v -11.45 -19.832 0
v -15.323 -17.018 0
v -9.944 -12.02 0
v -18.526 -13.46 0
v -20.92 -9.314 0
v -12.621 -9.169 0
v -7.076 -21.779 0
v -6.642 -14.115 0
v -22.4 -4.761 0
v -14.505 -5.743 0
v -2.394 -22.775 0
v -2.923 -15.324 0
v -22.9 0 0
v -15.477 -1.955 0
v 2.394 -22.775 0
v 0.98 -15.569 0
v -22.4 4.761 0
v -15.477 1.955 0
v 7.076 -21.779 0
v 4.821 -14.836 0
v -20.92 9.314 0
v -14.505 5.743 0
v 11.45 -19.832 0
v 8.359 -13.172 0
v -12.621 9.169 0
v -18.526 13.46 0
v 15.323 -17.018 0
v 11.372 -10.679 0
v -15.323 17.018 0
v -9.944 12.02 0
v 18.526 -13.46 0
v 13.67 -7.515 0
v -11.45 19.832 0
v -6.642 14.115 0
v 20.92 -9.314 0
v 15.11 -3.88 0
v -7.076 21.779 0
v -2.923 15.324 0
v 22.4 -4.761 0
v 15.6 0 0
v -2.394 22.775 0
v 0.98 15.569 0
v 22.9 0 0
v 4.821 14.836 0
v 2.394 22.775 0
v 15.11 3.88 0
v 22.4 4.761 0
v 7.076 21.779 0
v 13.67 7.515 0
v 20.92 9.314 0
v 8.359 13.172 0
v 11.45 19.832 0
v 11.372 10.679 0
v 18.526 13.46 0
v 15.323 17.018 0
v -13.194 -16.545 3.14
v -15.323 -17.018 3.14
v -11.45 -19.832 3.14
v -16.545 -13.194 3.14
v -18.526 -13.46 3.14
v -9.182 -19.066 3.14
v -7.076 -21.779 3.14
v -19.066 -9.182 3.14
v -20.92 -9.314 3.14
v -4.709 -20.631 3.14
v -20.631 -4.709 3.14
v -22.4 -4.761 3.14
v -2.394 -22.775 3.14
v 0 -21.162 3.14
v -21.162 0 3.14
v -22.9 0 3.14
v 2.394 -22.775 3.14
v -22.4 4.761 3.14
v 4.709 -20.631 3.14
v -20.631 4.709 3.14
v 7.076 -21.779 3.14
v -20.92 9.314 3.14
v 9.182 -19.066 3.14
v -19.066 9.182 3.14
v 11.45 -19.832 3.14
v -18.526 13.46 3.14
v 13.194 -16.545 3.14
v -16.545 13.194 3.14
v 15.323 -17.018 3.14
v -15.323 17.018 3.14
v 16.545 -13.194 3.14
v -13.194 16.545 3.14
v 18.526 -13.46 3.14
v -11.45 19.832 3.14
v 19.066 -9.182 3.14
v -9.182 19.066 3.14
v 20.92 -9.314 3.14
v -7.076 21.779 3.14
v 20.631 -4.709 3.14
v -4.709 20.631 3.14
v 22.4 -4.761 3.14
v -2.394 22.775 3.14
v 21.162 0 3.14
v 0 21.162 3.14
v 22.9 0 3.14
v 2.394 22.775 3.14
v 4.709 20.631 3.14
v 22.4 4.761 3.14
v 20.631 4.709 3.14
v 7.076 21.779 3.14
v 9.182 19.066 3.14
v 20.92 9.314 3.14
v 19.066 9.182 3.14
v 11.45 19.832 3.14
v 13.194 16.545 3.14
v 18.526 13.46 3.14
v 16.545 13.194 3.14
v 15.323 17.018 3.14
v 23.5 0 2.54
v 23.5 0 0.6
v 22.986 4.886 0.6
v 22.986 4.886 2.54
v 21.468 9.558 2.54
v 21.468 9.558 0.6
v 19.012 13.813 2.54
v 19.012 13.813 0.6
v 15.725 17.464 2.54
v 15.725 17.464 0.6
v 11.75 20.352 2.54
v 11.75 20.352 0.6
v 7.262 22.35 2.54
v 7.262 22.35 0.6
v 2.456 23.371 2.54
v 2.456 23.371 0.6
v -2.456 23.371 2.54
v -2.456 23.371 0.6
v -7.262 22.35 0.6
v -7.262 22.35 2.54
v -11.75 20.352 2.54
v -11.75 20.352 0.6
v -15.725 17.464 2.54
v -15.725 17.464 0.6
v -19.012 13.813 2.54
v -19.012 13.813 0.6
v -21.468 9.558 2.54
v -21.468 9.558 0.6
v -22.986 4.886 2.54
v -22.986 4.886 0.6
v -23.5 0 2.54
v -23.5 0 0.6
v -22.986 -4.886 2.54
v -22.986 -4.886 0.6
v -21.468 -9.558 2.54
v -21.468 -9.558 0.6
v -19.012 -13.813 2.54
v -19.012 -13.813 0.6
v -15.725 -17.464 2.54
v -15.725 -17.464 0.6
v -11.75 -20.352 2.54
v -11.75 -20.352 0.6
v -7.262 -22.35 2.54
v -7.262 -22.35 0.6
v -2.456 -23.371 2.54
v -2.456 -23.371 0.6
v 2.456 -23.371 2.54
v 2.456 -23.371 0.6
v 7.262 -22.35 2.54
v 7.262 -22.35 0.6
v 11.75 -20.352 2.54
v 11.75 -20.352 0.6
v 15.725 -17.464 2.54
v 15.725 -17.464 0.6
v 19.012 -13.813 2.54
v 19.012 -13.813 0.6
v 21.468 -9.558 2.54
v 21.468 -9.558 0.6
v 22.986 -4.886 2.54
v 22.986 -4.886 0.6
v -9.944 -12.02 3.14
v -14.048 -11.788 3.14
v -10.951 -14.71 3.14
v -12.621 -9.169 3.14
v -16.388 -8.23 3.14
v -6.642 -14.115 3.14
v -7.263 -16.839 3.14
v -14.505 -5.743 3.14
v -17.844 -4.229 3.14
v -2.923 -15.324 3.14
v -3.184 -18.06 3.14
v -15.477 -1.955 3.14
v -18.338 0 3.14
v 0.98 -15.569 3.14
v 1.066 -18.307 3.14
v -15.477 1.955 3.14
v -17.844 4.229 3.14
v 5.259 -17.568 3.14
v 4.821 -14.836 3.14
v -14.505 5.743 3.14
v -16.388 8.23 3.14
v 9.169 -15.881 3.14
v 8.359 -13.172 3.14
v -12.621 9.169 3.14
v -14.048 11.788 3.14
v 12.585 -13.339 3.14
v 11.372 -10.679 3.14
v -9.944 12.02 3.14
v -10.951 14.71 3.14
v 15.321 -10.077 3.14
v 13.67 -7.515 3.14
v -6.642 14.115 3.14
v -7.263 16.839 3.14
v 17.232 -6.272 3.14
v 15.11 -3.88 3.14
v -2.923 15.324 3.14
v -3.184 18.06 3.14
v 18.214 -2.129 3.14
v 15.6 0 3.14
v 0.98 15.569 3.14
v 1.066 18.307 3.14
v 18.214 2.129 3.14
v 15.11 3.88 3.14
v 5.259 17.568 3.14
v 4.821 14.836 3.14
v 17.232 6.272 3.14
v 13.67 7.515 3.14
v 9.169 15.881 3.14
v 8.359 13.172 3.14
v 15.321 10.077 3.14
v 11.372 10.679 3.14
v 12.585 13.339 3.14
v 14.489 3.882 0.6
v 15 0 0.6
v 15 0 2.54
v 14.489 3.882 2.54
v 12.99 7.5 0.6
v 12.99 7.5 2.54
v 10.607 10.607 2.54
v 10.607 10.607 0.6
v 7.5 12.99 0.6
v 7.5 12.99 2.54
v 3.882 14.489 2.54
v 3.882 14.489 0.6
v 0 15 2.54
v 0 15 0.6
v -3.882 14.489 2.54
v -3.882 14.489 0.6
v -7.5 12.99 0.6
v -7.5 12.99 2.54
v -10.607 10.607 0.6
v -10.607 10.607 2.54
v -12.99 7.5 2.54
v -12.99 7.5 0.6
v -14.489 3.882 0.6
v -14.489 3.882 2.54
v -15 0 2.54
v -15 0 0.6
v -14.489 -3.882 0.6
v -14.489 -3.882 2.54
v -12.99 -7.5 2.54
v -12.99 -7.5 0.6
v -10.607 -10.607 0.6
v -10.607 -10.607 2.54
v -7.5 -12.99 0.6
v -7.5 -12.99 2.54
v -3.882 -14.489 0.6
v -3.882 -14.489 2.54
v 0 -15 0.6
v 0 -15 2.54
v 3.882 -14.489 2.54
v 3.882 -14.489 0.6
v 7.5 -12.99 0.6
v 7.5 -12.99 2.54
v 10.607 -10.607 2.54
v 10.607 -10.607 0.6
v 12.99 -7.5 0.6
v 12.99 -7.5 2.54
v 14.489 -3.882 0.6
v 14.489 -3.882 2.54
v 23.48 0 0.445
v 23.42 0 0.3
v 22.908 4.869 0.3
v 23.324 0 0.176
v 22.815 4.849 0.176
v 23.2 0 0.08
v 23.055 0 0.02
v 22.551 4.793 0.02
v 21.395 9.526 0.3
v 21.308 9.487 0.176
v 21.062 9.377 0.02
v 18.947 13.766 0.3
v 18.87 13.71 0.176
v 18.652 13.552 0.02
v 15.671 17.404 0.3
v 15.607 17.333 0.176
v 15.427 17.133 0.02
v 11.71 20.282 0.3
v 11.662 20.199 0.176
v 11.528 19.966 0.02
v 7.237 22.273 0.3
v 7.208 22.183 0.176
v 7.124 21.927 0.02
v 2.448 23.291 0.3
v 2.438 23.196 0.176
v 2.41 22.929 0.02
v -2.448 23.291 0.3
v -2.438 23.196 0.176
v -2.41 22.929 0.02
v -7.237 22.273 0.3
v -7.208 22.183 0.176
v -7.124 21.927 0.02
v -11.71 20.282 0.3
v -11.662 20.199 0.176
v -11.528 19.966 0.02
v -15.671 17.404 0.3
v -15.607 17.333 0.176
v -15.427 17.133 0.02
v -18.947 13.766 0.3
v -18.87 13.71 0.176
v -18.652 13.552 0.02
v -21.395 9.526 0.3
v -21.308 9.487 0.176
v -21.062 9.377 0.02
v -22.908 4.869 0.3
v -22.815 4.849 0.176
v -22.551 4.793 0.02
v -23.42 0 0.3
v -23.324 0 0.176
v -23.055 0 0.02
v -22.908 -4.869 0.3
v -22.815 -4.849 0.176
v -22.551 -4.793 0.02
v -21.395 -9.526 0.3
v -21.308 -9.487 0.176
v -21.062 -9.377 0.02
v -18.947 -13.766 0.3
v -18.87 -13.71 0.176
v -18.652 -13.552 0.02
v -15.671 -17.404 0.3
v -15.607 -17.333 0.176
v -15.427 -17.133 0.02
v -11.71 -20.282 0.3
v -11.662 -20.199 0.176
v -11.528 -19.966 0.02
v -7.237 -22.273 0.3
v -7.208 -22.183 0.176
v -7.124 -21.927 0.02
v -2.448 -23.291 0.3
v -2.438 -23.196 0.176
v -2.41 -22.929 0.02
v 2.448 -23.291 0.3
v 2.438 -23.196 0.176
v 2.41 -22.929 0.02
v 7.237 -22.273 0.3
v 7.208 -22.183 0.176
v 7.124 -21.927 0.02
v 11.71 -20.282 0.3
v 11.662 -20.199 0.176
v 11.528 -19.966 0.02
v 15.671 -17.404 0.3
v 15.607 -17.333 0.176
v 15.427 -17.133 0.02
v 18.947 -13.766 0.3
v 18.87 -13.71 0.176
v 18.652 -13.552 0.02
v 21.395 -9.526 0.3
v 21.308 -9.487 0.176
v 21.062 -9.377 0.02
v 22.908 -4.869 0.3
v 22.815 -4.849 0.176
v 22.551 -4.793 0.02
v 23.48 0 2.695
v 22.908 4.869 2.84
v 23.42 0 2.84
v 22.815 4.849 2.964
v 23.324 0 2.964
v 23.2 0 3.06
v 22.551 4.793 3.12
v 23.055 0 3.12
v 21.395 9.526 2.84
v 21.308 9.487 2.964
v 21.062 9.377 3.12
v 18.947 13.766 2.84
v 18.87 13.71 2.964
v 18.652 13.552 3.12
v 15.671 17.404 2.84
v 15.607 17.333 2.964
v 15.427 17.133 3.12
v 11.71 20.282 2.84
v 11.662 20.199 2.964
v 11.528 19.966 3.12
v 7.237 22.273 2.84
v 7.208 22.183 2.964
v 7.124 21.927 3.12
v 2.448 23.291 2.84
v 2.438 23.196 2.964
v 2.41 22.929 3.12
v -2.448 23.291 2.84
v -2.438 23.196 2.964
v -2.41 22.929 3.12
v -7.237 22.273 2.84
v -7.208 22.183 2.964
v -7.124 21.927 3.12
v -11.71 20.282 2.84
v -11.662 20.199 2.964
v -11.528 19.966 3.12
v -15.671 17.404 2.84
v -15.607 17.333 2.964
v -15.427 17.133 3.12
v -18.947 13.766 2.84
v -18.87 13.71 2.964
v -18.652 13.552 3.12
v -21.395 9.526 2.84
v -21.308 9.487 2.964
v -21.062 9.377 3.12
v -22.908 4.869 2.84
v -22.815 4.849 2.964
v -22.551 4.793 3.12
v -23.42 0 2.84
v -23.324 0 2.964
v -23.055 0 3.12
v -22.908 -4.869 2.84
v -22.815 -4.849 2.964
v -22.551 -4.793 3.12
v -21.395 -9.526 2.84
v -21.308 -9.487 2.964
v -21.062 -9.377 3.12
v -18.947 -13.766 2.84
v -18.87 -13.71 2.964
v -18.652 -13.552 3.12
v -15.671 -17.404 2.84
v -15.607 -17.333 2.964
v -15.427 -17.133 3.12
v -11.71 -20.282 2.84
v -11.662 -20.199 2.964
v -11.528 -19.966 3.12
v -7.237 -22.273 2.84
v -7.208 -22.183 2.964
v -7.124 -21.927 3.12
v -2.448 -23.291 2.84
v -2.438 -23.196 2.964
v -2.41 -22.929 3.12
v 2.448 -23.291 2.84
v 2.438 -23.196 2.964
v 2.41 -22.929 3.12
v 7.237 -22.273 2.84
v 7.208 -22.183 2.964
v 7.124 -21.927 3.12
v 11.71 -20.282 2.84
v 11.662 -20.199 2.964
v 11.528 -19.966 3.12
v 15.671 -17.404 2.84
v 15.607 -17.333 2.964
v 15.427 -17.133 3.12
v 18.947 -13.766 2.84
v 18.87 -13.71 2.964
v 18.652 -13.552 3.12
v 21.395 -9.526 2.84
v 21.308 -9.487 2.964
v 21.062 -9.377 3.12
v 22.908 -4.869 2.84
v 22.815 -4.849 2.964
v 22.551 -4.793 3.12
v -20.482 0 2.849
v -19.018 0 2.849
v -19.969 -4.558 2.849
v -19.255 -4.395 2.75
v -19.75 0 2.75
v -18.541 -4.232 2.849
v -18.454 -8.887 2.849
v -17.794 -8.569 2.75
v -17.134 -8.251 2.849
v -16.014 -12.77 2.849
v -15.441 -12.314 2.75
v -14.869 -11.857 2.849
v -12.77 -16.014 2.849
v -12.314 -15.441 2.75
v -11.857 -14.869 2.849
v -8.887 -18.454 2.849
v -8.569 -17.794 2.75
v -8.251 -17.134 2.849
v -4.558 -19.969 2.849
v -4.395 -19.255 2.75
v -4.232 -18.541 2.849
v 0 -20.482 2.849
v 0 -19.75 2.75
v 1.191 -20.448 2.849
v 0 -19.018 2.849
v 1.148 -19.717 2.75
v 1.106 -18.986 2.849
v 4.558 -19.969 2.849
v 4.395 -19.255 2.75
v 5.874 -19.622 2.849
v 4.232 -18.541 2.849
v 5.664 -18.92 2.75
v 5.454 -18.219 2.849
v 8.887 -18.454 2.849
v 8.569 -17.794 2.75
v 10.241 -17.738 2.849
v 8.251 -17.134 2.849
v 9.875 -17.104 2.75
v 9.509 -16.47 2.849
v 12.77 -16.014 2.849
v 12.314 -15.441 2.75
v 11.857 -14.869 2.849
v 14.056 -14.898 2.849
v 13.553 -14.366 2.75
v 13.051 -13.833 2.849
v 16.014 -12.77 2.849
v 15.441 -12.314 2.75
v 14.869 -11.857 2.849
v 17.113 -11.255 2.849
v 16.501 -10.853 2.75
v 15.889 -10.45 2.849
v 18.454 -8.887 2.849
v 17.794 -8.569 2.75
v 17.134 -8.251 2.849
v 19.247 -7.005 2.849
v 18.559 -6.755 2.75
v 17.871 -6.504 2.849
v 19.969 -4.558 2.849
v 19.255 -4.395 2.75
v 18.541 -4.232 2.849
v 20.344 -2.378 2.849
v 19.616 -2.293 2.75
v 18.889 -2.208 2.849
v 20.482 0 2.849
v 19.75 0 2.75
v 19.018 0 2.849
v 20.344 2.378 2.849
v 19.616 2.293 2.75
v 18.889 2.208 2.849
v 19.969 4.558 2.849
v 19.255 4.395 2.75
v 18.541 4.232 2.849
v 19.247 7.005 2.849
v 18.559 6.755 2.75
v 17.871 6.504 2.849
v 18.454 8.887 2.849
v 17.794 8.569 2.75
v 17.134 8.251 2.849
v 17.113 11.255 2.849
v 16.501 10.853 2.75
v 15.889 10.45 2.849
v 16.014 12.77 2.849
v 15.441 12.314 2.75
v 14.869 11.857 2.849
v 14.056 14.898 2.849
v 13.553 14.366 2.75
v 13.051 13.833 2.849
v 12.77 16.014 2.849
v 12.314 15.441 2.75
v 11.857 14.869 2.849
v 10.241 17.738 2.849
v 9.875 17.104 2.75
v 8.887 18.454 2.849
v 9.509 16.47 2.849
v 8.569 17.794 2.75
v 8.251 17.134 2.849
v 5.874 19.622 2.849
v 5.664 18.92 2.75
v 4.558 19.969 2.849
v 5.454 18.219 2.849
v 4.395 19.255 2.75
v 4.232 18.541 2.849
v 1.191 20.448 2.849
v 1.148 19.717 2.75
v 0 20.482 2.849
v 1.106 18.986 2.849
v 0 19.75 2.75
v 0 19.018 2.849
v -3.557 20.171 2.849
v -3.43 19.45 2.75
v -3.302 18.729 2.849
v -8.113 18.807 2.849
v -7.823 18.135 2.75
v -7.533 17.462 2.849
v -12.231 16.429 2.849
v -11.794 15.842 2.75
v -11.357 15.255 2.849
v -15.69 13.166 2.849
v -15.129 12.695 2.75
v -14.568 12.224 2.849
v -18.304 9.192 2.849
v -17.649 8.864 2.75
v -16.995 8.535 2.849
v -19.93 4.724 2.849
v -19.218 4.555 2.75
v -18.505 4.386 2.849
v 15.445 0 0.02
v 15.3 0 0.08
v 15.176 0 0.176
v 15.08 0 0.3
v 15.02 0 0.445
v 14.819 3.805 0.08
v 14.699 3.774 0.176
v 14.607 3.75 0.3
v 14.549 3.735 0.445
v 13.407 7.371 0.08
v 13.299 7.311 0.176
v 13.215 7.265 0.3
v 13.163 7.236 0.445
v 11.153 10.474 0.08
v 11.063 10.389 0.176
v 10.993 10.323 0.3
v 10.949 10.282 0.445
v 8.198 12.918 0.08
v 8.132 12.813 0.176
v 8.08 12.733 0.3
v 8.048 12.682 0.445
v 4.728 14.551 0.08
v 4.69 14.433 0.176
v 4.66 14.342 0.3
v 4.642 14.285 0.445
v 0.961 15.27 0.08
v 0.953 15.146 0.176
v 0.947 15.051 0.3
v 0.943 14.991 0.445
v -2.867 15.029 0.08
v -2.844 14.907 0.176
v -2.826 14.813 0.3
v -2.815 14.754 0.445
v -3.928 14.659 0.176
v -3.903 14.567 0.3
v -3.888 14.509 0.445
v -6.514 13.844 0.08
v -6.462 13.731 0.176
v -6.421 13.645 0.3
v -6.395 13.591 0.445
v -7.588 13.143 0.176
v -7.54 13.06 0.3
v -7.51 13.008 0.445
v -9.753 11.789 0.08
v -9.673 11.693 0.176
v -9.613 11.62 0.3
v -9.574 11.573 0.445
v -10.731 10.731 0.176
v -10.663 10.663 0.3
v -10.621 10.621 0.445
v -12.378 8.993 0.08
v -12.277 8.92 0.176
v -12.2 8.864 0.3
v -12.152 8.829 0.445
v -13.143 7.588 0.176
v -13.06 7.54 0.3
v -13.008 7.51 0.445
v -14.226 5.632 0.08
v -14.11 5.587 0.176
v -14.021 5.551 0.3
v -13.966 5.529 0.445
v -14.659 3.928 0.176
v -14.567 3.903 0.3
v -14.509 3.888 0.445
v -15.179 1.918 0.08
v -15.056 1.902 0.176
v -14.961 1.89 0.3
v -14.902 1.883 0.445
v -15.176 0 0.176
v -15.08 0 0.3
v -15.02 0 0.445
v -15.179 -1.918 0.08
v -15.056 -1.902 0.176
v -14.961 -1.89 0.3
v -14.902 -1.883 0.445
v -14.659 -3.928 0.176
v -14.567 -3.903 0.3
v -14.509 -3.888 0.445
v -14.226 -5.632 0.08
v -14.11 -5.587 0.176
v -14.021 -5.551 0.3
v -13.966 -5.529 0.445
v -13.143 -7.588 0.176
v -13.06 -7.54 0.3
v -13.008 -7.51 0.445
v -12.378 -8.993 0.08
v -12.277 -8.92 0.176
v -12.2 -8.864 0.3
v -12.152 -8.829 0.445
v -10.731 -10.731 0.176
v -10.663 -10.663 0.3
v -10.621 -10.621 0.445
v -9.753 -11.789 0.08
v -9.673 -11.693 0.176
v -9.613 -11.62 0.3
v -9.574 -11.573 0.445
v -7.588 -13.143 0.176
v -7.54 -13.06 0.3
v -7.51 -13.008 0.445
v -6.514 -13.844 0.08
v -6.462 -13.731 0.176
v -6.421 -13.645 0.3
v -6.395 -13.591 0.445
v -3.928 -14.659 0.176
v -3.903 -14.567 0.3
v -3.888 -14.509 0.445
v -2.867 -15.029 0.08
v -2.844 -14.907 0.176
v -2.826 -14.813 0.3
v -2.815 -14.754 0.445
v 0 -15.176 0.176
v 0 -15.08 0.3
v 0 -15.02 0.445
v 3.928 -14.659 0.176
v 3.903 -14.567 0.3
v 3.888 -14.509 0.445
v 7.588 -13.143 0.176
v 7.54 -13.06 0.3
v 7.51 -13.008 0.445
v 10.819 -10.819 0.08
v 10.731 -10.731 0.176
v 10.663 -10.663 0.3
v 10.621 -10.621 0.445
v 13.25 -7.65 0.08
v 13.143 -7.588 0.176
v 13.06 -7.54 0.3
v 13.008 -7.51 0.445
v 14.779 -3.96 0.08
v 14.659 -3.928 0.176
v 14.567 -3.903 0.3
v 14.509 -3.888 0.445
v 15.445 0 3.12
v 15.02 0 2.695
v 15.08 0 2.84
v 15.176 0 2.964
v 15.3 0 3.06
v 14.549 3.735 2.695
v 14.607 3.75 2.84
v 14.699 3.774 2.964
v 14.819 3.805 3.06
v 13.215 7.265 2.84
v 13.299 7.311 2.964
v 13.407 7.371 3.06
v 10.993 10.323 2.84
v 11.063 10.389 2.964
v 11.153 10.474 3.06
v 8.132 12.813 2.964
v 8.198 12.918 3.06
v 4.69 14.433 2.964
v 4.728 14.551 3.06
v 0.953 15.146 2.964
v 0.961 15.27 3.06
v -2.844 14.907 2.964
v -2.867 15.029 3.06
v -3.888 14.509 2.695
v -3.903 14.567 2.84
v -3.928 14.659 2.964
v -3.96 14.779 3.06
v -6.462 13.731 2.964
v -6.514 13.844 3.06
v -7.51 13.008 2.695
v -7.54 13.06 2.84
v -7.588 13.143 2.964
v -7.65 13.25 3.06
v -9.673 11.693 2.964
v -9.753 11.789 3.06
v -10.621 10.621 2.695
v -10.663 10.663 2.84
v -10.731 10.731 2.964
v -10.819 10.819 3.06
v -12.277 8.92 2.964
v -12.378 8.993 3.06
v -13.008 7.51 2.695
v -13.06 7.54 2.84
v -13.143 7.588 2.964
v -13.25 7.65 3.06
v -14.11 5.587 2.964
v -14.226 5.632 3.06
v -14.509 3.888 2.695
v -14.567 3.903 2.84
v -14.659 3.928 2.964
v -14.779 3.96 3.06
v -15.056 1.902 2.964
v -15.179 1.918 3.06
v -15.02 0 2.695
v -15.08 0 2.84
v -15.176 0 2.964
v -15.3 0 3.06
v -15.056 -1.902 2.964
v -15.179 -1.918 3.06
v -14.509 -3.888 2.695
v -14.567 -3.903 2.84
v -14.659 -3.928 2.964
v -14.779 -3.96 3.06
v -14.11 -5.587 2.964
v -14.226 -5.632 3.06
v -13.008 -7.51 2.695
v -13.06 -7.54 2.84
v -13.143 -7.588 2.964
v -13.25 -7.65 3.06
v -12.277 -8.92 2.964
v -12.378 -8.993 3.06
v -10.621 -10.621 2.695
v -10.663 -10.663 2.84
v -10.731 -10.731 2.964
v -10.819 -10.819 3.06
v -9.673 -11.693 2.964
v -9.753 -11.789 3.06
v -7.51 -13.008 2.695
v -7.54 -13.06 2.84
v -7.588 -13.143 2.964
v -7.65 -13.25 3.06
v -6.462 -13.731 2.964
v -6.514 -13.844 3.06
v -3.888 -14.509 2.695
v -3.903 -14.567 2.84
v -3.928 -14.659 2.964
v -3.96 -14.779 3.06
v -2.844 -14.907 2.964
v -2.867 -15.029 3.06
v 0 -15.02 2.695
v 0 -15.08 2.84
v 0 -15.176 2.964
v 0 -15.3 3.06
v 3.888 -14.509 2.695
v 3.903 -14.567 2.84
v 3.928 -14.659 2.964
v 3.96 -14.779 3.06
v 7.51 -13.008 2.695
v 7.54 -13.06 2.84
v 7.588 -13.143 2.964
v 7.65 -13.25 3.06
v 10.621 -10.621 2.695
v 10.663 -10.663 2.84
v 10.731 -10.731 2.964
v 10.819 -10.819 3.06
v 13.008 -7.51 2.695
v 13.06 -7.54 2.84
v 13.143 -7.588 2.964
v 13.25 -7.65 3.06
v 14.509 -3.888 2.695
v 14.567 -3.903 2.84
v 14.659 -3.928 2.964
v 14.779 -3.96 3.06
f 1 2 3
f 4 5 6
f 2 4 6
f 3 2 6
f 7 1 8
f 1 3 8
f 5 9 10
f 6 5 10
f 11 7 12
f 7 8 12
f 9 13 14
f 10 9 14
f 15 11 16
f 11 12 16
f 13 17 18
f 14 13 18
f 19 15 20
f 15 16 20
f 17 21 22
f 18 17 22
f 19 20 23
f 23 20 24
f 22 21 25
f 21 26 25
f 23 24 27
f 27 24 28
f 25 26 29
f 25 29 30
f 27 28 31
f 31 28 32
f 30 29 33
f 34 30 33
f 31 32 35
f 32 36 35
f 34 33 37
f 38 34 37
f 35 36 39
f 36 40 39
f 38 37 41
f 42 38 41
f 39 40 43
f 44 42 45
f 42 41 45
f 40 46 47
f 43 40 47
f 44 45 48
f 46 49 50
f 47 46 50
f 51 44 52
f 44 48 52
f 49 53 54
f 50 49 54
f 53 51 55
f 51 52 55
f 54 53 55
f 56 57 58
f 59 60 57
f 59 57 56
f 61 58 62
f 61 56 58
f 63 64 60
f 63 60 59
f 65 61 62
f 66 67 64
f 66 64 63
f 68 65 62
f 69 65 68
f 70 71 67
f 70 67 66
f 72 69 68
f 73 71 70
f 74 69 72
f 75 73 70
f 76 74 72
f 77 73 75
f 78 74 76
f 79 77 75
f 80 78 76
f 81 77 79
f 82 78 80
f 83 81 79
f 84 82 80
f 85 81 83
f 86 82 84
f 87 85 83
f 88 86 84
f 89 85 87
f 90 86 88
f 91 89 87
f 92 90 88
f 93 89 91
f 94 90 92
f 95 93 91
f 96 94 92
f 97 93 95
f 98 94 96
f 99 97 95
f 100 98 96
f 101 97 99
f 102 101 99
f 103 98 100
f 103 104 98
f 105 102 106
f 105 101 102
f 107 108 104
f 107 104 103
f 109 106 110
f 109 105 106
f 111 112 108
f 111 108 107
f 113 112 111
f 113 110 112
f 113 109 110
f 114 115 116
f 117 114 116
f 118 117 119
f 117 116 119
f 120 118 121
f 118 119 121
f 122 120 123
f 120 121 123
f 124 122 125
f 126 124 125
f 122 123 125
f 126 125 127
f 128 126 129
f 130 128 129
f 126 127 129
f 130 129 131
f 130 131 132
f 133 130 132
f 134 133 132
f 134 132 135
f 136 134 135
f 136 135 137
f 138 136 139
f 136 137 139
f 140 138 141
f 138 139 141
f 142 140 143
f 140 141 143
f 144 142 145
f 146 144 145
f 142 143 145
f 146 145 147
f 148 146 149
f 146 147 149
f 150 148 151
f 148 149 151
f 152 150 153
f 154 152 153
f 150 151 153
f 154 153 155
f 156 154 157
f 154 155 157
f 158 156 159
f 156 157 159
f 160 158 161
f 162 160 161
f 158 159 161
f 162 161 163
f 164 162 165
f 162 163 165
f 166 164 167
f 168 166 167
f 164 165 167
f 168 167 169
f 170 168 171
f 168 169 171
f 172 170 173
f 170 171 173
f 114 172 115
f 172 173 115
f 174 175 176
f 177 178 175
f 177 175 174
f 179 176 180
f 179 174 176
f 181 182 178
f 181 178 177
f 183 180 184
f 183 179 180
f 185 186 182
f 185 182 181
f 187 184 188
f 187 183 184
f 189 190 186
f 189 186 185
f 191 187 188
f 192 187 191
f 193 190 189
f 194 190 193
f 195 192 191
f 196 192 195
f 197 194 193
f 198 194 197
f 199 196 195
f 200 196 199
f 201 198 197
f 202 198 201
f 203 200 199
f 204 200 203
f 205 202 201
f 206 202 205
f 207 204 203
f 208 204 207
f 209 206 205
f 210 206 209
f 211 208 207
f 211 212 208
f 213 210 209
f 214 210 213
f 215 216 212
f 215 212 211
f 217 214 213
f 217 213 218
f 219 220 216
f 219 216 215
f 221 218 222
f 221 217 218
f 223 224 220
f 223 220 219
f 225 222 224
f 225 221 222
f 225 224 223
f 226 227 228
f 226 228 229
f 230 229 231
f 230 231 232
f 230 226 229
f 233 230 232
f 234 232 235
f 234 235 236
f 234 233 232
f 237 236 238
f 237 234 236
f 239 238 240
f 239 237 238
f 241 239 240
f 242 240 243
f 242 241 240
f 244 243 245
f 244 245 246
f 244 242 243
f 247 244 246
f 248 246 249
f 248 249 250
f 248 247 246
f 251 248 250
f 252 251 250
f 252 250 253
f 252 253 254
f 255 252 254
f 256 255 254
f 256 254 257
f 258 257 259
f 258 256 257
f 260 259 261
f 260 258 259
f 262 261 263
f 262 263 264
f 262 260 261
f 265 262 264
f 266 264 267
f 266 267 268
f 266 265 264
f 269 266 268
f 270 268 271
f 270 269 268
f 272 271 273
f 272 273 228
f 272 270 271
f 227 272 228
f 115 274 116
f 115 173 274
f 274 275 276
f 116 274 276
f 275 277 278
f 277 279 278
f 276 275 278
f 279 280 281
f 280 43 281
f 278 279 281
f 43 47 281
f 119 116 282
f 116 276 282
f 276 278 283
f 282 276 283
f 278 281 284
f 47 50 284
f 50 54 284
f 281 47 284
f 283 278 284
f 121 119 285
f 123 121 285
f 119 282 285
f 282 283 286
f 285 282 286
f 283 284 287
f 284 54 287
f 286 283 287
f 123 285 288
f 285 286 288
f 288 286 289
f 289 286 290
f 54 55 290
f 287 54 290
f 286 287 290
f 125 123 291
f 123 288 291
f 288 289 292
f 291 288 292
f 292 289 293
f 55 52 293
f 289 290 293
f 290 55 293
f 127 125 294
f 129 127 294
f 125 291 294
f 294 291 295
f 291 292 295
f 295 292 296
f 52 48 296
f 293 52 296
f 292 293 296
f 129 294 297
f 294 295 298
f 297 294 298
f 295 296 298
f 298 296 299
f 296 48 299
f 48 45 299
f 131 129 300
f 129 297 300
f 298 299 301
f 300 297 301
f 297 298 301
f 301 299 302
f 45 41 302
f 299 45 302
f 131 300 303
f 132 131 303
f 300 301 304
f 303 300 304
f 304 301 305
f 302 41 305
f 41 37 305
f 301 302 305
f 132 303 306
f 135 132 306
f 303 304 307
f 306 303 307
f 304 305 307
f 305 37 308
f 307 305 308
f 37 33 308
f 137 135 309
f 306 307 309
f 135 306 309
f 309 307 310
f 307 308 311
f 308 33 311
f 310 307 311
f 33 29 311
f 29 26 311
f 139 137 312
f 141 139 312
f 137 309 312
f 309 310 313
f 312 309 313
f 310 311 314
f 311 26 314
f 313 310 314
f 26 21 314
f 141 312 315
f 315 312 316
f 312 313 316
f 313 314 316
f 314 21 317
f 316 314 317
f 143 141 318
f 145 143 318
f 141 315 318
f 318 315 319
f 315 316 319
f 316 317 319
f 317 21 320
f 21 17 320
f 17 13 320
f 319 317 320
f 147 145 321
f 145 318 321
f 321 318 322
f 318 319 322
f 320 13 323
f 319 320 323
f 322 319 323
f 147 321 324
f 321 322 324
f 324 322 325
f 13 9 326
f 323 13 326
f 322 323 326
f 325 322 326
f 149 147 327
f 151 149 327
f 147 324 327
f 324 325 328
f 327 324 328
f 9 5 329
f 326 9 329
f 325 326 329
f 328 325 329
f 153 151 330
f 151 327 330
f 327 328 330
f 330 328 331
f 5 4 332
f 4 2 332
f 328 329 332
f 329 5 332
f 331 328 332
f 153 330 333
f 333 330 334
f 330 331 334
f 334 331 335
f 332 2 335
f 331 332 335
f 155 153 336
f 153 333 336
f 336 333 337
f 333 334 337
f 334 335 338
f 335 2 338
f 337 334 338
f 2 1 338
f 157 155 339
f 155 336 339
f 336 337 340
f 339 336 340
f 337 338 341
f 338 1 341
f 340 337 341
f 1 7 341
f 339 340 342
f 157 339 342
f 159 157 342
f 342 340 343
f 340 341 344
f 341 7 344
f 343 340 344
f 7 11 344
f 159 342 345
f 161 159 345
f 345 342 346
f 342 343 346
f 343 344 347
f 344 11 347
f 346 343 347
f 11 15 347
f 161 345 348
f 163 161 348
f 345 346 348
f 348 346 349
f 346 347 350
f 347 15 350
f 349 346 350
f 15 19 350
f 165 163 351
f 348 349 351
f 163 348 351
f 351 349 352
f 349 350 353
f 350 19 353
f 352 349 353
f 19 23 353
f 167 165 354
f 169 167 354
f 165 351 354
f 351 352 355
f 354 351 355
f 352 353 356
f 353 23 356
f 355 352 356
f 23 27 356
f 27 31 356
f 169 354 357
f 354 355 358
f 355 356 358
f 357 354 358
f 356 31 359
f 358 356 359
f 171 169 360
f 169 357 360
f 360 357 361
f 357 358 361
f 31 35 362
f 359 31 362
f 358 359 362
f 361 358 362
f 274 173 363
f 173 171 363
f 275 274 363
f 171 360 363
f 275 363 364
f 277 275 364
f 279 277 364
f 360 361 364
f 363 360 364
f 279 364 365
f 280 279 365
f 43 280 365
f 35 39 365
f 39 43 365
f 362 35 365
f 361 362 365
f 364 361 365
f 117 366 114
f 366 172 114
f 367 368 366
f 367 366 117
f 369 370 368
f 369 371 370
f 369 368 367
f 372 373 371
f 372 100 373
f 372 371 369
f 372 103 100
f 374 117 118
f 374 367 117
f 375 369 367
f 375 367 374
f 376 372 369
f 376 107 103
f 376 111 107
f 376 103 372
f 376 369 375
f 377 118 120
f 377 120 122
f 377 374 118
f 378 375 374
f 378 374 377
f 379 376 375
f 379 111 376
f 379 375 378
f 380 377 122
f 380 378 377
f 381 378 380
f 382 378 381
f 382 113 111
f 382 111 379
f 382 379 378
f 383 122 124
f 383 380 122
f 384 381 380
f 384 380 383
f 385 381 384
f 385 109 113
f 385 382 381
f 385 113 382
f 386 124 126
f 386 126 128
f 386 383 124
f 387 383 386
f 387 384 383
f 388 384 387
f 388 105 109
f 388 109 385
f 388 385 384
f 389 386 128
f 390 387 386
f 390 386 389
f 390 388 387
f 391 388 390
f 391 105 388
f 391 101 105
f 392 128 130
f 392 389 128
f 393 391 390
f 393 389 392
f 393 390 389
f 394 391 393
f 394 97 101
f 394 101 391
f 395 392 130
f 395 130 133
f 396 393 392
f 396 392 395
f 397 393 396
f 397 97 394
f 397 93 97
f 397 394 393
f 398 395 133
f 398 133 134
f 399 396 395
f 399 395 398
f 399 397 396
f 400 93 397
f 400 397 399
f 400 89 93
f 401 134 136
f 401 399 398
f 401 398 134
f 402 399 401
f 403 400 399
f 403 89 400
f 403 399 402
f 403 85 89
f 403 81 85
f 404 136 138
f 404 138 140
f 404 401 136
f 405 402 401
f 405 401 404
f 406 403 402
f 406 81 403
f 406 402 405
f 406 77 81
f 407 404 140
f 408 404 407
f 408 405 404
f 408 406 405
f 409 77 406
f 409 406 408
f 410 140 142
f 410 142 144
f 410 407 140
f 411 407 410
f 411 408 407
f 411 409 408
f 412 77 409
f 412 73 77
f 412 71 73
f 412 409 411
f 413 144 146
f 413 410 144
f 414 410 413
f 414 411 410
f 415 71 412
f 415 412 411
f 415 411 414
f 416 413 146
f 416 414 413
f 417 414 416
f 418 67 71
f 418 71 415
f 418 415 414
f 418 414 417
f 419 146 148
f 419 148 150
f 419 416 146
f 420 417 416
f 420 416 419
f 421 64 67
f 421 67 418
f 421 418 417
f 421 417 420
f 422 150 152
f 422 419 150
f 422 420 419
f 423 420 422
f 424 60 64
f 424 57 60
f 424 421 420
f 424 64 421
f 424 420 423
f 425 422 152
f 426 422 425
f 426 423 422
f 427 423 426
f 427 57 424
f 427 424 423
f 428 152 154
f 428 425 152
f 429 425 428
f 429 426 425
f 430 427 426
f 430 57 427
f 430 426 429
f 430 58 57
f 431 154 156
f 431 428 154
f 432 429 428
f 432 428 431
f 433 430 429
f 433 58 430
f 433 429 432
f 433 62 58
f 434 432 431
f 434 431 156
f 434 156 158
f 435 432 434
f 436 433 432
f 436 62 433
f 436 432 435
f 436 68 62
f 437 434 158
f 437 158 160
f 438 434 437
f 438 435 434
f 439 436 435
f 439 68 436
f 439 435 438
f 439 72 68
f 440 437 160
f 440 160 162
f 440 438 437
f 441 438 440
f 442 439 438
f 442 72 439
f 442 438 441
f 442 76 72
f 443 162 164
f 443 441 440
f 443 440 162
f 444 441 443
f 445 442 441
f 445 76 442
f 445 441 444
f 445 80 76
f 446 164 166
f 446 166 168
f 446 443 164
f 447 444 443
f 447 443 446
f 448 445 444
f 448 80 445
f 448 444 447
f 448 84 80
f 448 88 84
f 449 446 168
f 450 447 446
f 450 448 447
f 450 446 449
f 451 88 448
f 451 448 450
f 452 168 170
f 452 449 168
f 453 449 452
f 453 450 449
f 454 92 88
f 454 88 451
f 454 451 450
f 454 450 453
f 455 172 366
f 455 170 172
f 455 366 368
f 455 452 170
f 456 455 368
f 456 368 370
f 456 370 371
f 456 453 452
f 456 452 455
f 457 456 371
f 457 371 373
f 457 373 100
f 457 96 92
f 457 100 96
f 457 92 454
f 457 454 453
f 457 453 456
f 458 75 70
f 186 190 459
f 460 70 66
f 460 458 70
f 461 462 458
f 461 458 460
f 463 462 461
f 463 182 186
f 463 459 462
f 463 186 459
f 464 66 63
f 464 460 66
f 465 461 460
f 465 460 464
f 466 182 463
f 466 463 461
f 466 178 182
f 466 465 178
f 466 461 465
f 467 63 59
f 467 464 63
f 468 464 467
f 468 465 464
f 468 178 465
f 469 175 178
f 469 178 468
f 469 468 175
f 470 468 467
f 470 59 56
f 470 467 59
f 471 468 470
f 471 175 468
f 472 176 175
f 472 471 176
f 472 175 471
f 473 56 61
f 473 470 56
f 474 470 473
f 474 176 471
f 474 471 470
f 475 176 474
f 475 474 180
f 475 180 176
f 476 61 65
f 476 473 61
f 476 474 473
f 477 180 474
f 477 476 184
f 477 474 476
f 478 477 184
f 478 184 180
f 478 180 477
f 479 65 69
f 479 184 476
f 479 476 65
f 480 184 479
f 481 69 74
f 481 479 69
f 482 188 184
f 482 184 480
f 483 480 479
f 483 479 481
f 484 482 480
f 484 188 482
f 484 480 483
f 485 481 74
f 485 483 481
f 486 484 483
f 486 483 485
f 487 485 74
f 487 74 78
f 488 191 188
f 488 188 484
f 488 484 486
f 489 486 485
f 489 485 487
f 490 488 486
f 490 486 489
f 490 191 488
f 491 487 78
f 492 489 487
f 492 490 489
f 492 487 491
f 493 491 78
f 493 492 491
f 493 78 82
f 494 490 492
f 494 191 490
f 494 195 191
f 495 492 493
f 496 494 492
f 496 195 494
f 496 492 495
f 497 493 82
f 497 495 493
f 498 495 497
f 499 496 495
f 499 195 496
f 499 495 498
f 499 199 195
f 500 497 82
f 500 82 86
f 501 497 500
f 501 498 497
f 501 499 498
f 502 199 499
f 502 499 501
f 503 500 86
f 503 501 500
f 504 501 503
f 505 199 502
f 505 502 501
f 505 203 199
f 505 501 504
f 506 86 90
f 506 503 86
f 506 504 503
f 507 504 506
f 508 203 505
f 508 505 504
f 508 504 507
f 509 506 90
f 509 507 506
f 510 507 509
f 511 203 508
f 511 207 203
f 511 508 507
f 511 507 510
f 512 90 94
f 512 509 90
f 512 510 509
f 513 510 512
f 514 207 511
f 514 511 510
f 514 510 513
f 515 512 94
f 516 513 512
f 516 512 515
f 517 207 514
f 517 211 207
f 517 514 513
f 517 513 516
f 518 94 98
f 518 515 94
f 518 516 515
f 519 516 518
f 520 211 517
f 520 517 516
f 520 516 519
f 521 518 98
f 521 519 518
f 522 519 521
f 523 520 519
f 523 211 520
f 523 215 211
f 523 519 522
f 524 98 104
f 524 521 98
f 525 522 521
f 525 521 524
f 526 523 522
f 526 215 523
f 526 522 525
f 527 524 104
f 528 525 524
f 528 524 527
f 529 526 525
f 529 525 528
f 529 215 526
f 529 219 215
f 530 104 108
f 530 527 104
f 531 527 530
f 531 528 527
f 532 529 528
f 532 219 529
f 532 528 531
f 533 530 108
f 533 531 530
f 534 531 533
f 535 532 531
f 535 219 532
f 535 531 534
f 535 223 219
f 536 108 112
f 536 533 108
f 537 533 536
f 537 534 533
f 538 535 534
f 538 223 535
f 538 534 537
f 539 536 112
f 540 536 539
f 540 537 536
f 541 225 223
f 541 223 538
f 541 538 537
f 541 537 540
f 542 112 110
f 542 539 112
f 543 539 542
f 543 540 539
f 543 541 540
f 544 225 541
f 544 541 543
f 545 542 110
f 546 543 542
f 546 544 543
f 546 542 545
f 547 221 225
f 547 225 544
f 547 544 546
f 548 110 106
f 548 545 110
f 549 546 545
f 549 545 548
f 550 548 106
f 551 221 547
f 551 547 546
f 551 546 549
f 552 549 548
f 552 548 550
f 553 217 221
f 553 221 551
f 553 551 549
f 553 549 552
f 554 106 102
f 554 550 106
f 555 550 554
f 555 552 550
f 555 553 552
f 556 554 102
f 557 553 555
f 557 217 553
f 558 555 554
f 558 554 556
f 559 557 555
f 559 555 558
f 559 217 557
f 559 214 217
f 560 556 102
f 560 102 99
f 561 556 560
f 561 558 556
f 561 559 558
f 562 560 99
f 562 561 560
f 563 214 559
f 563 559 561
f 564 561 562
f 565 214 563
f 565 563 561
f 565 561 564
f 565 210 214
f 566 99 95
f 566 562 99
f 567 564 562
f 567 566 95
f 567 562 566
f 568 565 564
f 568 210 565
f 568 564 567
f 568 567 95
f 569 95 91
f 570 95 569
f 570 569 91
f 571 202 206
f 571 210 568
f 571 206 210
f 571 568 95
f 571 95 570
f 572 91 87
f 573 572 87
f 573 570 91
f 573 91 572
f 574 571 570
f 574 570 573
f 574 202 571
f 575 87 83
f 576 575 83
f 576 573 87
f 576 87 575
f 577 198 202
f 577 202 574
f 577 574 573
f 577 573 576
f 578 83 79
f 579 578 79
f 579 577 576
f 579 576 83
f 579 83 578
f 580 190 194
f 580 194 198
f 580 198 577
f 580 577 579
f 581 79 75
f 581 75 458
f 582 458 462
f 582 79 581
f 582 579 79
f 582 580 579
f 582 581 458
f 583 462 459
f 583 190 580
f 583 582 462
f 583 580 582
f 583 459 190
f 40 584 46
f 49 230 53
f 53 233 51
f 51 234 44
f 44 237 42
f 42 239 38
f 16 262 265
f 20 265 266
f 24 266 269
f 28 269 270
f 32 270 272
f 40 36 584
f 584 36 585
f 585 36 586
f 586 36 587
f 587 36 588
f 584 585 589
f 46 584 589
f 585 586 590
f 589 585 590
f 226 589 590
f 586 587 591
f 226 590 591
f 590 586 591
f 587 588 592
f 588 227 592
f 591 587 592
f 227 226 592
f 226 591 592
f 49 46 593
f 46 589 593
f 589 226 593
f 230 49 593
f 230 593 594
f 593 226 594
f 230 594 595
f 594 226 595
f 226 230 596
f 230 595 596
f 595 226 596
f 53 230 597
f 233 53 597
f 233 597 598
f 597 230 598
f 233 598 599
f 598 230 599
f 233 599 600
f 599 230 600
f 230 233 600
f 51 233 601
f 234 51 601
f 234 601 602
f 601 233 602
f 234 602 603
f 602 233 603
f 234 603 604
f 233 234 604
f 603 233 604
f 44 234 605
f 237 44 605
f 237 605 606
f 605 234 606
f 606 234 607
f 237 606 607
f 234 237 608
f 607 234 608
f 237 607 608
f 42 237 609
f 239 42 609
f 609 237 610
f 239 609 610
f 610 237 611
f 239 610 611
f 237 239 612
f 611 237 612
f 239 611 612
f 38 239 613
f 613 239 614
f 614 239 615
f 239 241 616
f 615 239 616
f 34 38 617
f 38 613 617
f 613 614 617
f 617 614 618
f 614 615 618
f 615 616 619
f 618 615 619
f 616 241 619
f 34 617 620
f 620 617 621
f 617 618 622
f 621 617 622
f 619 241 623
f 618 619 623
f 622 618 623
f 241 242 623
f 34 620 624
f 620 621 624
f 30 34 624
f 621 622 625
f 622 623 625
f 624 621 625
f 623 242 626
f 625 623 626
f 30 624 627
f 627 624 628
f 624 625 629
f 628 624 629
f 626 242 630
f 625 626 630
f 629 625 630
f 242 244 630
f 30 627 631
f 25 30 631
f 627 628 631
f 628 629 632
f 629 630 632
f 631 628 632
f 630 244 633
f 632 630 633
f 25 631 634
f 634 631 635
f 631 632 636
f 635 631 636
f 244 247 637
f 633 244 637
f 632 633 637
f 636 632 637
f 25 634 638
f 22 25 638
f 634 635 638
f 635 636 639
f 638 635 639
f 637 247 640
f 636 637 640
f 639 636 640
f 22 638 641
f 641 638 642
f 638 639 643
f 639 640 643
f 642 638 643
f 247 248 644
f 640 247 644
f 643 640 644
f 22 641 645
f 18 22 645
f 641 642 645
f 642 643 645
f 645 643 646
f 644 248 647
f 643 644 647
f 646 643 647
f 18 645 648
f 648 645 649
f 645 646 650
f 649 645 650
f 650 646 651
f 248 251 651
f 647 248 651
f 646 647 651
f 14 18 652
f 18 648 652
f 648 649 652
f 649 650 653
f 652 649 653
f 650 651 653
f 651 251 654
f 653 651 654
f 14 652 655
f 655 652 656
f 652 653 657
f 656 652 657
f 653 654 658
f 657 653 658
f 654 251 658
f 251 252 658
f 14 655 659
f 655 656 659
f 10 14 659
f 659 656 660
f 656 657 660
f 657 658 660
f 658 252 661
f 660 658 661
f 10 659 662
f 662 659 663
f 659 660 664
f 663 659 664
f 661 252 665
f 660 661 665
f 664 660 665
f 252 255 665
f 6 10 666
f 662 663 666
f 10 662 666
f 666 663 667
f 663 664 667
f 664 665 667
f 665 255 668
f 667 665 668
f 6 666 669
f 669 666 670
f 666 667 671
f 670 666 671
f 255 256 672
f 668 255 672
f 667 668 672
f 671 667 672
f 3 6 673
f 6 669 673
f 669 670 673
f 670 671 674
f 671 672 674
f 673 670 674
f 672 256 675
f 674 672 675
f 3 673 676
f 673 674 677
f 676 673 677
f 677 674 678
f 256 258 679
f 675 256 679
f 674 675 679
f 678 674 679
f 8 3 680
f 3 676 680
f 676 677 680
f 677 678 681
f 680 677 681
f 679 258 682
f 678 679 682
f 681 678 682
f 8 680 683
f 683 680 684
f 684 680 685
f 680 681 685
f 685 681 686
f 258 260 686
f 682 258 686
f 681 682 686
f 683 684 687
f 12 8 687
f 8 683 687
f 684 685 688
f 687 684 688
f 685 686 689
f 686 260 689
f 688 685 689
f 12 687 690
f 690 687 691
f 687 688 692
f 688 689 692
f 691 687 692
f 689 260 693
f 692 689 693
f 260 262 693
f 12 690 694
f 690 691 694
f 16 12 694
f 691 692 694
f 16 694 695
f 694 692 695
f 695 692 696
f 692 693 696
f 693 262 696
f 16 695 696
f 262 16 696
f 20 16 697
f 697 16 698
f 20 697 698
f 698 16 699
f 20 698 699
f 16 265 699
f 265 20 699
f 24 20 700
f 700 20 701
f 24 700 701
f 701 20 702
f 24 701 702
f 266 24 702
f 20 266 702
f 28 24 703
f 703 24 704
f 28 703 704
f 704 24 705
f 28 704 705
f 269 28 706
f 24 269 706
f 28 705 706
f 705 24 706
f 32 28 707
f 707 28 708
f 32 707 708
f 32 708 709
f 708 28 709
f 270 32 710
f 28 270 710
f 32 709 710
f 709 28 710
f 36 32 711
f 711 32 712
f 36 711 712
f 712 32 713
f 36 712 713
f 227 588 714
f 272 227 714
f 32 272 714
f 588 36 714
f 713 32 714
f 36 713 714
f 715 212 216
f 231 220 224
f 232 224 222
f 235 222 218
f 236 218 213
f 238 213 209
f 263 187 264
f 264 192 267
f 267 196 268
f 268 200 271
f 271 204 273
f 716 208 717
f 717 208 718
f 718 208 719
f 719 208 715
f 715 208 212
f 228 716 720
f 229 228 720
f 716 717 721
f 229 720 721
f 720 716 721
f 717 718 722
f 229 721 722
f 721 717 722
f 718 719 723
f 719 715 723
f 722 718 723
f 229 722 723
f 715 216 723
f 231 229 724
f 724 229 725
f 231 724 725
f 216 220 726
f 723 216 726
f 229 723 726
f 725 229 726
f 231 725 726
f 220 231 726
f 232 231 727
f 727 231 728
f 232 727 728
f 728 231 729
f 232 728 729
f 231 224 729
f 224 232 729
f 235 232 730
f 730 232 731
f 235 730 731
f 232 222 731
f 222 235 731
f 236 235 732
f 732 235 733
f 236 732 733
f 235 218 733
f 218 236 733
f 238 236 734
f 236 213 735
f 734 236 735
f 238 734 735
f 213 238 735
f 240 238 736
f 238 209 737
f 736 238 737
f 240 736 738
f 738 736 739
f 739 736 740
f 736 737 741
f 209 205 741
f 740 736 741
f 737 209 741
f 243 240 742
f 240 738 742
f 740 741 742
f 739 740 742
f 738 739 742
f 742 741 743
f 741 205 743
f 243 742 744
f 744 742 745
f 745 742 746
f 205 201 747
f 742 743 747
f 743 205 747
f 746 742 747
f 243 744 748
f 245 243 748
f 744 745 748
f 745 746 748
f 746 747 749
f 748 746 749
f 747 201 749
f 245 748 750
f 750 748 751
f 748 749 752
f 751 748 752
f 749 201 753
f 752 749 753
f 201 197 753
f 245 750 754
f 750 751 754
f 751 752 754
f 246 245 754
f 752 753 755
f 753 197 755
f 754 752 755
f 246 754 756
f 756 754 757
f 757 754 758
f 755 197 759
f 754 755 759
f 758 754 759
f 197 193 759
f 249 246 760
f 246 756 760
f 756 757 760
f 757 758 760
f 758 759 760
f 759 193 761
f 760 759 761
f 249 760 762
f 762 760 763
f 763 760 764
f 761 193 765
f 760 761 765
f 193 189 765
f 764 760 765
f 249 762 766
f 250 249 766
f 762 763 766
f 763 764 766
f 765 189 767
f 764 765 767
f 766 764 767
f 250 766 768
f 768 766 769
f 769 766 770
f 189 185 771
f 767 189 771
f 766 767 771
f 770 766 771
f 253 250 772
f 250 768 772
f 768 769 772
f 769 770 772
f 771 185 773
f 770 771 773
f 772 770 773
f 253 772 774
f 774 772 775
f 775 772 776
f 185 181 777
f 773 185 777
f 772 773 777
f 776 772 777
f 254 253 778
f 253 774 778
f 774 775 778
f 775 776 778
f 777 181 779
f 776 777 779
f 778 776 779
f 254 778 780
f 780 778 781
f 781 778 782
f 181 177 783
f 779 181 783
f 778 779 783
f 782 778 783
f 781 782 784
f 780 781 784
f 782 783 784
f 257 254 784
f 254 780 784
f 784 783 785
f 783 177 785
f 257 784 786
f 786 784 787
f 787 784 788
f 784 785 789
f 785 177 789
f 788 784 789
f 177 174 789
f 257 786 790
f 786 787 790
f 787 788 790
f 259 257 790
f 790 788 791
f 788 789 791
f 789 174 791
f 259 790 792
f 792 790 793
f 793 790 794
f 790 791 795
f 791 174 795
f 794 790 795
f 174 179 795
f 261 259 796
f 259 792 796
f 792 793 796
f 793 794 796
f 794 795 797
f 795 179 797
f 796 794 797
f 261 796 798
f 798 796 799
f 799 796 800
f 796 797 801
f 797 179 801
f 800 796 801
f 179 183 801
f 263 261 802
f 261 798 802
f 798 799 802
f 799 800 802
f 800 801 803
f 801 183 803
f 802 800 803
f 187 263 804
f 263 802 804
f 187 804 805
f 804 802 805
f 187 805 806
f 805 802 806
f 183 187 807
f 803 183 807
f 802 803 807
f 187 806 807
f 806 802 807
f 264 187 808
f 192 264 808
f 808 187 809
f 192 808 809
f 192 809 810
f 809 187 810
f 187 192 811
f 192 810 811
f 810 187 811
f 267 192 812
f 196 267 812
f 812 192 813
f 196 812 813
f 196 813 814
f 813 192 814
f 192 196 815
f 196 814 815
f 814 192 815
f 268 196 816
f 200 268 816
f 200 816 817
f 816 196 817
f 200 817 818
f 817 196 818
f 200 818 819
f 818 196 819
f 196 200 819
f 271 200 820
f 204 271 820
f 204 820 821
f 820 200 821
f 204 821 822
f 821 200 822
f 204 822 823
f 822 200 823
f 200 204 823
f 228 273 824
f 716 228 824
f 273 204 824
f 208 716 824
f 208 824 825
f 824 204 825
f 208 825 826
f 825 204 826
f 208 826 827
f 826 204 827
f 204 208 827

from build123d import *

# Parameters (mm, degrees)
ESQUISSE1_R        = 23.5
ESQUISSE1_R_2      = 15
BOSS_EXTRU_1_DEPTH = 3.14
ESQUISSE2_R        = 2.75
CONG_1_R           = 0.6


with BuildPart() as part:
    # Esquisse1 → Boss.-Extru.1 (new body)
    with BuildSketch(Plane.XY):
        Circle(ESQUISSE1_R)
        Circle(ESQUISSE1_R_2, mode=Mode.SUBTRACT)
    extrude(amount=BOSS_EXTRU_1_DEPTH)

    # Esquisse2 → Enlèvement de matière-Révolution1 (revolve, cut)
    with BuildSketch(Plane(origin=(0, 0, 0), x_dir=(1, 0, 0), z_dir=(0, 1, 0)), mode=Mode.PRIVATE) as enl_vement_de_mati_re_r_volution1_sk:
        with Locations((19.75, -5.5)):
            Circle(ESQUISSE2_R)
    revolve(enl_vement_de_mati_re_r_volution1_sk.sketch.rotate(Axis((0, 0, 0), (0, 0, 1)), 180), axis=Axis((0, 0, 0), (0, 0, 1)), mode=Mode.SUBTRACT)

    # Congé1
    cong_1_edges = [part.edges().sort_by_distance(p)[0] for p in [
        (-23.5, 0, 0),
        (-23.5, 0, 3.14),
        (-15, 0, 0),
        (-15, 0, 3.14),
    ]]
    fillet(cong_1_edges, radius=CONG_1_R)


solid = part.part
